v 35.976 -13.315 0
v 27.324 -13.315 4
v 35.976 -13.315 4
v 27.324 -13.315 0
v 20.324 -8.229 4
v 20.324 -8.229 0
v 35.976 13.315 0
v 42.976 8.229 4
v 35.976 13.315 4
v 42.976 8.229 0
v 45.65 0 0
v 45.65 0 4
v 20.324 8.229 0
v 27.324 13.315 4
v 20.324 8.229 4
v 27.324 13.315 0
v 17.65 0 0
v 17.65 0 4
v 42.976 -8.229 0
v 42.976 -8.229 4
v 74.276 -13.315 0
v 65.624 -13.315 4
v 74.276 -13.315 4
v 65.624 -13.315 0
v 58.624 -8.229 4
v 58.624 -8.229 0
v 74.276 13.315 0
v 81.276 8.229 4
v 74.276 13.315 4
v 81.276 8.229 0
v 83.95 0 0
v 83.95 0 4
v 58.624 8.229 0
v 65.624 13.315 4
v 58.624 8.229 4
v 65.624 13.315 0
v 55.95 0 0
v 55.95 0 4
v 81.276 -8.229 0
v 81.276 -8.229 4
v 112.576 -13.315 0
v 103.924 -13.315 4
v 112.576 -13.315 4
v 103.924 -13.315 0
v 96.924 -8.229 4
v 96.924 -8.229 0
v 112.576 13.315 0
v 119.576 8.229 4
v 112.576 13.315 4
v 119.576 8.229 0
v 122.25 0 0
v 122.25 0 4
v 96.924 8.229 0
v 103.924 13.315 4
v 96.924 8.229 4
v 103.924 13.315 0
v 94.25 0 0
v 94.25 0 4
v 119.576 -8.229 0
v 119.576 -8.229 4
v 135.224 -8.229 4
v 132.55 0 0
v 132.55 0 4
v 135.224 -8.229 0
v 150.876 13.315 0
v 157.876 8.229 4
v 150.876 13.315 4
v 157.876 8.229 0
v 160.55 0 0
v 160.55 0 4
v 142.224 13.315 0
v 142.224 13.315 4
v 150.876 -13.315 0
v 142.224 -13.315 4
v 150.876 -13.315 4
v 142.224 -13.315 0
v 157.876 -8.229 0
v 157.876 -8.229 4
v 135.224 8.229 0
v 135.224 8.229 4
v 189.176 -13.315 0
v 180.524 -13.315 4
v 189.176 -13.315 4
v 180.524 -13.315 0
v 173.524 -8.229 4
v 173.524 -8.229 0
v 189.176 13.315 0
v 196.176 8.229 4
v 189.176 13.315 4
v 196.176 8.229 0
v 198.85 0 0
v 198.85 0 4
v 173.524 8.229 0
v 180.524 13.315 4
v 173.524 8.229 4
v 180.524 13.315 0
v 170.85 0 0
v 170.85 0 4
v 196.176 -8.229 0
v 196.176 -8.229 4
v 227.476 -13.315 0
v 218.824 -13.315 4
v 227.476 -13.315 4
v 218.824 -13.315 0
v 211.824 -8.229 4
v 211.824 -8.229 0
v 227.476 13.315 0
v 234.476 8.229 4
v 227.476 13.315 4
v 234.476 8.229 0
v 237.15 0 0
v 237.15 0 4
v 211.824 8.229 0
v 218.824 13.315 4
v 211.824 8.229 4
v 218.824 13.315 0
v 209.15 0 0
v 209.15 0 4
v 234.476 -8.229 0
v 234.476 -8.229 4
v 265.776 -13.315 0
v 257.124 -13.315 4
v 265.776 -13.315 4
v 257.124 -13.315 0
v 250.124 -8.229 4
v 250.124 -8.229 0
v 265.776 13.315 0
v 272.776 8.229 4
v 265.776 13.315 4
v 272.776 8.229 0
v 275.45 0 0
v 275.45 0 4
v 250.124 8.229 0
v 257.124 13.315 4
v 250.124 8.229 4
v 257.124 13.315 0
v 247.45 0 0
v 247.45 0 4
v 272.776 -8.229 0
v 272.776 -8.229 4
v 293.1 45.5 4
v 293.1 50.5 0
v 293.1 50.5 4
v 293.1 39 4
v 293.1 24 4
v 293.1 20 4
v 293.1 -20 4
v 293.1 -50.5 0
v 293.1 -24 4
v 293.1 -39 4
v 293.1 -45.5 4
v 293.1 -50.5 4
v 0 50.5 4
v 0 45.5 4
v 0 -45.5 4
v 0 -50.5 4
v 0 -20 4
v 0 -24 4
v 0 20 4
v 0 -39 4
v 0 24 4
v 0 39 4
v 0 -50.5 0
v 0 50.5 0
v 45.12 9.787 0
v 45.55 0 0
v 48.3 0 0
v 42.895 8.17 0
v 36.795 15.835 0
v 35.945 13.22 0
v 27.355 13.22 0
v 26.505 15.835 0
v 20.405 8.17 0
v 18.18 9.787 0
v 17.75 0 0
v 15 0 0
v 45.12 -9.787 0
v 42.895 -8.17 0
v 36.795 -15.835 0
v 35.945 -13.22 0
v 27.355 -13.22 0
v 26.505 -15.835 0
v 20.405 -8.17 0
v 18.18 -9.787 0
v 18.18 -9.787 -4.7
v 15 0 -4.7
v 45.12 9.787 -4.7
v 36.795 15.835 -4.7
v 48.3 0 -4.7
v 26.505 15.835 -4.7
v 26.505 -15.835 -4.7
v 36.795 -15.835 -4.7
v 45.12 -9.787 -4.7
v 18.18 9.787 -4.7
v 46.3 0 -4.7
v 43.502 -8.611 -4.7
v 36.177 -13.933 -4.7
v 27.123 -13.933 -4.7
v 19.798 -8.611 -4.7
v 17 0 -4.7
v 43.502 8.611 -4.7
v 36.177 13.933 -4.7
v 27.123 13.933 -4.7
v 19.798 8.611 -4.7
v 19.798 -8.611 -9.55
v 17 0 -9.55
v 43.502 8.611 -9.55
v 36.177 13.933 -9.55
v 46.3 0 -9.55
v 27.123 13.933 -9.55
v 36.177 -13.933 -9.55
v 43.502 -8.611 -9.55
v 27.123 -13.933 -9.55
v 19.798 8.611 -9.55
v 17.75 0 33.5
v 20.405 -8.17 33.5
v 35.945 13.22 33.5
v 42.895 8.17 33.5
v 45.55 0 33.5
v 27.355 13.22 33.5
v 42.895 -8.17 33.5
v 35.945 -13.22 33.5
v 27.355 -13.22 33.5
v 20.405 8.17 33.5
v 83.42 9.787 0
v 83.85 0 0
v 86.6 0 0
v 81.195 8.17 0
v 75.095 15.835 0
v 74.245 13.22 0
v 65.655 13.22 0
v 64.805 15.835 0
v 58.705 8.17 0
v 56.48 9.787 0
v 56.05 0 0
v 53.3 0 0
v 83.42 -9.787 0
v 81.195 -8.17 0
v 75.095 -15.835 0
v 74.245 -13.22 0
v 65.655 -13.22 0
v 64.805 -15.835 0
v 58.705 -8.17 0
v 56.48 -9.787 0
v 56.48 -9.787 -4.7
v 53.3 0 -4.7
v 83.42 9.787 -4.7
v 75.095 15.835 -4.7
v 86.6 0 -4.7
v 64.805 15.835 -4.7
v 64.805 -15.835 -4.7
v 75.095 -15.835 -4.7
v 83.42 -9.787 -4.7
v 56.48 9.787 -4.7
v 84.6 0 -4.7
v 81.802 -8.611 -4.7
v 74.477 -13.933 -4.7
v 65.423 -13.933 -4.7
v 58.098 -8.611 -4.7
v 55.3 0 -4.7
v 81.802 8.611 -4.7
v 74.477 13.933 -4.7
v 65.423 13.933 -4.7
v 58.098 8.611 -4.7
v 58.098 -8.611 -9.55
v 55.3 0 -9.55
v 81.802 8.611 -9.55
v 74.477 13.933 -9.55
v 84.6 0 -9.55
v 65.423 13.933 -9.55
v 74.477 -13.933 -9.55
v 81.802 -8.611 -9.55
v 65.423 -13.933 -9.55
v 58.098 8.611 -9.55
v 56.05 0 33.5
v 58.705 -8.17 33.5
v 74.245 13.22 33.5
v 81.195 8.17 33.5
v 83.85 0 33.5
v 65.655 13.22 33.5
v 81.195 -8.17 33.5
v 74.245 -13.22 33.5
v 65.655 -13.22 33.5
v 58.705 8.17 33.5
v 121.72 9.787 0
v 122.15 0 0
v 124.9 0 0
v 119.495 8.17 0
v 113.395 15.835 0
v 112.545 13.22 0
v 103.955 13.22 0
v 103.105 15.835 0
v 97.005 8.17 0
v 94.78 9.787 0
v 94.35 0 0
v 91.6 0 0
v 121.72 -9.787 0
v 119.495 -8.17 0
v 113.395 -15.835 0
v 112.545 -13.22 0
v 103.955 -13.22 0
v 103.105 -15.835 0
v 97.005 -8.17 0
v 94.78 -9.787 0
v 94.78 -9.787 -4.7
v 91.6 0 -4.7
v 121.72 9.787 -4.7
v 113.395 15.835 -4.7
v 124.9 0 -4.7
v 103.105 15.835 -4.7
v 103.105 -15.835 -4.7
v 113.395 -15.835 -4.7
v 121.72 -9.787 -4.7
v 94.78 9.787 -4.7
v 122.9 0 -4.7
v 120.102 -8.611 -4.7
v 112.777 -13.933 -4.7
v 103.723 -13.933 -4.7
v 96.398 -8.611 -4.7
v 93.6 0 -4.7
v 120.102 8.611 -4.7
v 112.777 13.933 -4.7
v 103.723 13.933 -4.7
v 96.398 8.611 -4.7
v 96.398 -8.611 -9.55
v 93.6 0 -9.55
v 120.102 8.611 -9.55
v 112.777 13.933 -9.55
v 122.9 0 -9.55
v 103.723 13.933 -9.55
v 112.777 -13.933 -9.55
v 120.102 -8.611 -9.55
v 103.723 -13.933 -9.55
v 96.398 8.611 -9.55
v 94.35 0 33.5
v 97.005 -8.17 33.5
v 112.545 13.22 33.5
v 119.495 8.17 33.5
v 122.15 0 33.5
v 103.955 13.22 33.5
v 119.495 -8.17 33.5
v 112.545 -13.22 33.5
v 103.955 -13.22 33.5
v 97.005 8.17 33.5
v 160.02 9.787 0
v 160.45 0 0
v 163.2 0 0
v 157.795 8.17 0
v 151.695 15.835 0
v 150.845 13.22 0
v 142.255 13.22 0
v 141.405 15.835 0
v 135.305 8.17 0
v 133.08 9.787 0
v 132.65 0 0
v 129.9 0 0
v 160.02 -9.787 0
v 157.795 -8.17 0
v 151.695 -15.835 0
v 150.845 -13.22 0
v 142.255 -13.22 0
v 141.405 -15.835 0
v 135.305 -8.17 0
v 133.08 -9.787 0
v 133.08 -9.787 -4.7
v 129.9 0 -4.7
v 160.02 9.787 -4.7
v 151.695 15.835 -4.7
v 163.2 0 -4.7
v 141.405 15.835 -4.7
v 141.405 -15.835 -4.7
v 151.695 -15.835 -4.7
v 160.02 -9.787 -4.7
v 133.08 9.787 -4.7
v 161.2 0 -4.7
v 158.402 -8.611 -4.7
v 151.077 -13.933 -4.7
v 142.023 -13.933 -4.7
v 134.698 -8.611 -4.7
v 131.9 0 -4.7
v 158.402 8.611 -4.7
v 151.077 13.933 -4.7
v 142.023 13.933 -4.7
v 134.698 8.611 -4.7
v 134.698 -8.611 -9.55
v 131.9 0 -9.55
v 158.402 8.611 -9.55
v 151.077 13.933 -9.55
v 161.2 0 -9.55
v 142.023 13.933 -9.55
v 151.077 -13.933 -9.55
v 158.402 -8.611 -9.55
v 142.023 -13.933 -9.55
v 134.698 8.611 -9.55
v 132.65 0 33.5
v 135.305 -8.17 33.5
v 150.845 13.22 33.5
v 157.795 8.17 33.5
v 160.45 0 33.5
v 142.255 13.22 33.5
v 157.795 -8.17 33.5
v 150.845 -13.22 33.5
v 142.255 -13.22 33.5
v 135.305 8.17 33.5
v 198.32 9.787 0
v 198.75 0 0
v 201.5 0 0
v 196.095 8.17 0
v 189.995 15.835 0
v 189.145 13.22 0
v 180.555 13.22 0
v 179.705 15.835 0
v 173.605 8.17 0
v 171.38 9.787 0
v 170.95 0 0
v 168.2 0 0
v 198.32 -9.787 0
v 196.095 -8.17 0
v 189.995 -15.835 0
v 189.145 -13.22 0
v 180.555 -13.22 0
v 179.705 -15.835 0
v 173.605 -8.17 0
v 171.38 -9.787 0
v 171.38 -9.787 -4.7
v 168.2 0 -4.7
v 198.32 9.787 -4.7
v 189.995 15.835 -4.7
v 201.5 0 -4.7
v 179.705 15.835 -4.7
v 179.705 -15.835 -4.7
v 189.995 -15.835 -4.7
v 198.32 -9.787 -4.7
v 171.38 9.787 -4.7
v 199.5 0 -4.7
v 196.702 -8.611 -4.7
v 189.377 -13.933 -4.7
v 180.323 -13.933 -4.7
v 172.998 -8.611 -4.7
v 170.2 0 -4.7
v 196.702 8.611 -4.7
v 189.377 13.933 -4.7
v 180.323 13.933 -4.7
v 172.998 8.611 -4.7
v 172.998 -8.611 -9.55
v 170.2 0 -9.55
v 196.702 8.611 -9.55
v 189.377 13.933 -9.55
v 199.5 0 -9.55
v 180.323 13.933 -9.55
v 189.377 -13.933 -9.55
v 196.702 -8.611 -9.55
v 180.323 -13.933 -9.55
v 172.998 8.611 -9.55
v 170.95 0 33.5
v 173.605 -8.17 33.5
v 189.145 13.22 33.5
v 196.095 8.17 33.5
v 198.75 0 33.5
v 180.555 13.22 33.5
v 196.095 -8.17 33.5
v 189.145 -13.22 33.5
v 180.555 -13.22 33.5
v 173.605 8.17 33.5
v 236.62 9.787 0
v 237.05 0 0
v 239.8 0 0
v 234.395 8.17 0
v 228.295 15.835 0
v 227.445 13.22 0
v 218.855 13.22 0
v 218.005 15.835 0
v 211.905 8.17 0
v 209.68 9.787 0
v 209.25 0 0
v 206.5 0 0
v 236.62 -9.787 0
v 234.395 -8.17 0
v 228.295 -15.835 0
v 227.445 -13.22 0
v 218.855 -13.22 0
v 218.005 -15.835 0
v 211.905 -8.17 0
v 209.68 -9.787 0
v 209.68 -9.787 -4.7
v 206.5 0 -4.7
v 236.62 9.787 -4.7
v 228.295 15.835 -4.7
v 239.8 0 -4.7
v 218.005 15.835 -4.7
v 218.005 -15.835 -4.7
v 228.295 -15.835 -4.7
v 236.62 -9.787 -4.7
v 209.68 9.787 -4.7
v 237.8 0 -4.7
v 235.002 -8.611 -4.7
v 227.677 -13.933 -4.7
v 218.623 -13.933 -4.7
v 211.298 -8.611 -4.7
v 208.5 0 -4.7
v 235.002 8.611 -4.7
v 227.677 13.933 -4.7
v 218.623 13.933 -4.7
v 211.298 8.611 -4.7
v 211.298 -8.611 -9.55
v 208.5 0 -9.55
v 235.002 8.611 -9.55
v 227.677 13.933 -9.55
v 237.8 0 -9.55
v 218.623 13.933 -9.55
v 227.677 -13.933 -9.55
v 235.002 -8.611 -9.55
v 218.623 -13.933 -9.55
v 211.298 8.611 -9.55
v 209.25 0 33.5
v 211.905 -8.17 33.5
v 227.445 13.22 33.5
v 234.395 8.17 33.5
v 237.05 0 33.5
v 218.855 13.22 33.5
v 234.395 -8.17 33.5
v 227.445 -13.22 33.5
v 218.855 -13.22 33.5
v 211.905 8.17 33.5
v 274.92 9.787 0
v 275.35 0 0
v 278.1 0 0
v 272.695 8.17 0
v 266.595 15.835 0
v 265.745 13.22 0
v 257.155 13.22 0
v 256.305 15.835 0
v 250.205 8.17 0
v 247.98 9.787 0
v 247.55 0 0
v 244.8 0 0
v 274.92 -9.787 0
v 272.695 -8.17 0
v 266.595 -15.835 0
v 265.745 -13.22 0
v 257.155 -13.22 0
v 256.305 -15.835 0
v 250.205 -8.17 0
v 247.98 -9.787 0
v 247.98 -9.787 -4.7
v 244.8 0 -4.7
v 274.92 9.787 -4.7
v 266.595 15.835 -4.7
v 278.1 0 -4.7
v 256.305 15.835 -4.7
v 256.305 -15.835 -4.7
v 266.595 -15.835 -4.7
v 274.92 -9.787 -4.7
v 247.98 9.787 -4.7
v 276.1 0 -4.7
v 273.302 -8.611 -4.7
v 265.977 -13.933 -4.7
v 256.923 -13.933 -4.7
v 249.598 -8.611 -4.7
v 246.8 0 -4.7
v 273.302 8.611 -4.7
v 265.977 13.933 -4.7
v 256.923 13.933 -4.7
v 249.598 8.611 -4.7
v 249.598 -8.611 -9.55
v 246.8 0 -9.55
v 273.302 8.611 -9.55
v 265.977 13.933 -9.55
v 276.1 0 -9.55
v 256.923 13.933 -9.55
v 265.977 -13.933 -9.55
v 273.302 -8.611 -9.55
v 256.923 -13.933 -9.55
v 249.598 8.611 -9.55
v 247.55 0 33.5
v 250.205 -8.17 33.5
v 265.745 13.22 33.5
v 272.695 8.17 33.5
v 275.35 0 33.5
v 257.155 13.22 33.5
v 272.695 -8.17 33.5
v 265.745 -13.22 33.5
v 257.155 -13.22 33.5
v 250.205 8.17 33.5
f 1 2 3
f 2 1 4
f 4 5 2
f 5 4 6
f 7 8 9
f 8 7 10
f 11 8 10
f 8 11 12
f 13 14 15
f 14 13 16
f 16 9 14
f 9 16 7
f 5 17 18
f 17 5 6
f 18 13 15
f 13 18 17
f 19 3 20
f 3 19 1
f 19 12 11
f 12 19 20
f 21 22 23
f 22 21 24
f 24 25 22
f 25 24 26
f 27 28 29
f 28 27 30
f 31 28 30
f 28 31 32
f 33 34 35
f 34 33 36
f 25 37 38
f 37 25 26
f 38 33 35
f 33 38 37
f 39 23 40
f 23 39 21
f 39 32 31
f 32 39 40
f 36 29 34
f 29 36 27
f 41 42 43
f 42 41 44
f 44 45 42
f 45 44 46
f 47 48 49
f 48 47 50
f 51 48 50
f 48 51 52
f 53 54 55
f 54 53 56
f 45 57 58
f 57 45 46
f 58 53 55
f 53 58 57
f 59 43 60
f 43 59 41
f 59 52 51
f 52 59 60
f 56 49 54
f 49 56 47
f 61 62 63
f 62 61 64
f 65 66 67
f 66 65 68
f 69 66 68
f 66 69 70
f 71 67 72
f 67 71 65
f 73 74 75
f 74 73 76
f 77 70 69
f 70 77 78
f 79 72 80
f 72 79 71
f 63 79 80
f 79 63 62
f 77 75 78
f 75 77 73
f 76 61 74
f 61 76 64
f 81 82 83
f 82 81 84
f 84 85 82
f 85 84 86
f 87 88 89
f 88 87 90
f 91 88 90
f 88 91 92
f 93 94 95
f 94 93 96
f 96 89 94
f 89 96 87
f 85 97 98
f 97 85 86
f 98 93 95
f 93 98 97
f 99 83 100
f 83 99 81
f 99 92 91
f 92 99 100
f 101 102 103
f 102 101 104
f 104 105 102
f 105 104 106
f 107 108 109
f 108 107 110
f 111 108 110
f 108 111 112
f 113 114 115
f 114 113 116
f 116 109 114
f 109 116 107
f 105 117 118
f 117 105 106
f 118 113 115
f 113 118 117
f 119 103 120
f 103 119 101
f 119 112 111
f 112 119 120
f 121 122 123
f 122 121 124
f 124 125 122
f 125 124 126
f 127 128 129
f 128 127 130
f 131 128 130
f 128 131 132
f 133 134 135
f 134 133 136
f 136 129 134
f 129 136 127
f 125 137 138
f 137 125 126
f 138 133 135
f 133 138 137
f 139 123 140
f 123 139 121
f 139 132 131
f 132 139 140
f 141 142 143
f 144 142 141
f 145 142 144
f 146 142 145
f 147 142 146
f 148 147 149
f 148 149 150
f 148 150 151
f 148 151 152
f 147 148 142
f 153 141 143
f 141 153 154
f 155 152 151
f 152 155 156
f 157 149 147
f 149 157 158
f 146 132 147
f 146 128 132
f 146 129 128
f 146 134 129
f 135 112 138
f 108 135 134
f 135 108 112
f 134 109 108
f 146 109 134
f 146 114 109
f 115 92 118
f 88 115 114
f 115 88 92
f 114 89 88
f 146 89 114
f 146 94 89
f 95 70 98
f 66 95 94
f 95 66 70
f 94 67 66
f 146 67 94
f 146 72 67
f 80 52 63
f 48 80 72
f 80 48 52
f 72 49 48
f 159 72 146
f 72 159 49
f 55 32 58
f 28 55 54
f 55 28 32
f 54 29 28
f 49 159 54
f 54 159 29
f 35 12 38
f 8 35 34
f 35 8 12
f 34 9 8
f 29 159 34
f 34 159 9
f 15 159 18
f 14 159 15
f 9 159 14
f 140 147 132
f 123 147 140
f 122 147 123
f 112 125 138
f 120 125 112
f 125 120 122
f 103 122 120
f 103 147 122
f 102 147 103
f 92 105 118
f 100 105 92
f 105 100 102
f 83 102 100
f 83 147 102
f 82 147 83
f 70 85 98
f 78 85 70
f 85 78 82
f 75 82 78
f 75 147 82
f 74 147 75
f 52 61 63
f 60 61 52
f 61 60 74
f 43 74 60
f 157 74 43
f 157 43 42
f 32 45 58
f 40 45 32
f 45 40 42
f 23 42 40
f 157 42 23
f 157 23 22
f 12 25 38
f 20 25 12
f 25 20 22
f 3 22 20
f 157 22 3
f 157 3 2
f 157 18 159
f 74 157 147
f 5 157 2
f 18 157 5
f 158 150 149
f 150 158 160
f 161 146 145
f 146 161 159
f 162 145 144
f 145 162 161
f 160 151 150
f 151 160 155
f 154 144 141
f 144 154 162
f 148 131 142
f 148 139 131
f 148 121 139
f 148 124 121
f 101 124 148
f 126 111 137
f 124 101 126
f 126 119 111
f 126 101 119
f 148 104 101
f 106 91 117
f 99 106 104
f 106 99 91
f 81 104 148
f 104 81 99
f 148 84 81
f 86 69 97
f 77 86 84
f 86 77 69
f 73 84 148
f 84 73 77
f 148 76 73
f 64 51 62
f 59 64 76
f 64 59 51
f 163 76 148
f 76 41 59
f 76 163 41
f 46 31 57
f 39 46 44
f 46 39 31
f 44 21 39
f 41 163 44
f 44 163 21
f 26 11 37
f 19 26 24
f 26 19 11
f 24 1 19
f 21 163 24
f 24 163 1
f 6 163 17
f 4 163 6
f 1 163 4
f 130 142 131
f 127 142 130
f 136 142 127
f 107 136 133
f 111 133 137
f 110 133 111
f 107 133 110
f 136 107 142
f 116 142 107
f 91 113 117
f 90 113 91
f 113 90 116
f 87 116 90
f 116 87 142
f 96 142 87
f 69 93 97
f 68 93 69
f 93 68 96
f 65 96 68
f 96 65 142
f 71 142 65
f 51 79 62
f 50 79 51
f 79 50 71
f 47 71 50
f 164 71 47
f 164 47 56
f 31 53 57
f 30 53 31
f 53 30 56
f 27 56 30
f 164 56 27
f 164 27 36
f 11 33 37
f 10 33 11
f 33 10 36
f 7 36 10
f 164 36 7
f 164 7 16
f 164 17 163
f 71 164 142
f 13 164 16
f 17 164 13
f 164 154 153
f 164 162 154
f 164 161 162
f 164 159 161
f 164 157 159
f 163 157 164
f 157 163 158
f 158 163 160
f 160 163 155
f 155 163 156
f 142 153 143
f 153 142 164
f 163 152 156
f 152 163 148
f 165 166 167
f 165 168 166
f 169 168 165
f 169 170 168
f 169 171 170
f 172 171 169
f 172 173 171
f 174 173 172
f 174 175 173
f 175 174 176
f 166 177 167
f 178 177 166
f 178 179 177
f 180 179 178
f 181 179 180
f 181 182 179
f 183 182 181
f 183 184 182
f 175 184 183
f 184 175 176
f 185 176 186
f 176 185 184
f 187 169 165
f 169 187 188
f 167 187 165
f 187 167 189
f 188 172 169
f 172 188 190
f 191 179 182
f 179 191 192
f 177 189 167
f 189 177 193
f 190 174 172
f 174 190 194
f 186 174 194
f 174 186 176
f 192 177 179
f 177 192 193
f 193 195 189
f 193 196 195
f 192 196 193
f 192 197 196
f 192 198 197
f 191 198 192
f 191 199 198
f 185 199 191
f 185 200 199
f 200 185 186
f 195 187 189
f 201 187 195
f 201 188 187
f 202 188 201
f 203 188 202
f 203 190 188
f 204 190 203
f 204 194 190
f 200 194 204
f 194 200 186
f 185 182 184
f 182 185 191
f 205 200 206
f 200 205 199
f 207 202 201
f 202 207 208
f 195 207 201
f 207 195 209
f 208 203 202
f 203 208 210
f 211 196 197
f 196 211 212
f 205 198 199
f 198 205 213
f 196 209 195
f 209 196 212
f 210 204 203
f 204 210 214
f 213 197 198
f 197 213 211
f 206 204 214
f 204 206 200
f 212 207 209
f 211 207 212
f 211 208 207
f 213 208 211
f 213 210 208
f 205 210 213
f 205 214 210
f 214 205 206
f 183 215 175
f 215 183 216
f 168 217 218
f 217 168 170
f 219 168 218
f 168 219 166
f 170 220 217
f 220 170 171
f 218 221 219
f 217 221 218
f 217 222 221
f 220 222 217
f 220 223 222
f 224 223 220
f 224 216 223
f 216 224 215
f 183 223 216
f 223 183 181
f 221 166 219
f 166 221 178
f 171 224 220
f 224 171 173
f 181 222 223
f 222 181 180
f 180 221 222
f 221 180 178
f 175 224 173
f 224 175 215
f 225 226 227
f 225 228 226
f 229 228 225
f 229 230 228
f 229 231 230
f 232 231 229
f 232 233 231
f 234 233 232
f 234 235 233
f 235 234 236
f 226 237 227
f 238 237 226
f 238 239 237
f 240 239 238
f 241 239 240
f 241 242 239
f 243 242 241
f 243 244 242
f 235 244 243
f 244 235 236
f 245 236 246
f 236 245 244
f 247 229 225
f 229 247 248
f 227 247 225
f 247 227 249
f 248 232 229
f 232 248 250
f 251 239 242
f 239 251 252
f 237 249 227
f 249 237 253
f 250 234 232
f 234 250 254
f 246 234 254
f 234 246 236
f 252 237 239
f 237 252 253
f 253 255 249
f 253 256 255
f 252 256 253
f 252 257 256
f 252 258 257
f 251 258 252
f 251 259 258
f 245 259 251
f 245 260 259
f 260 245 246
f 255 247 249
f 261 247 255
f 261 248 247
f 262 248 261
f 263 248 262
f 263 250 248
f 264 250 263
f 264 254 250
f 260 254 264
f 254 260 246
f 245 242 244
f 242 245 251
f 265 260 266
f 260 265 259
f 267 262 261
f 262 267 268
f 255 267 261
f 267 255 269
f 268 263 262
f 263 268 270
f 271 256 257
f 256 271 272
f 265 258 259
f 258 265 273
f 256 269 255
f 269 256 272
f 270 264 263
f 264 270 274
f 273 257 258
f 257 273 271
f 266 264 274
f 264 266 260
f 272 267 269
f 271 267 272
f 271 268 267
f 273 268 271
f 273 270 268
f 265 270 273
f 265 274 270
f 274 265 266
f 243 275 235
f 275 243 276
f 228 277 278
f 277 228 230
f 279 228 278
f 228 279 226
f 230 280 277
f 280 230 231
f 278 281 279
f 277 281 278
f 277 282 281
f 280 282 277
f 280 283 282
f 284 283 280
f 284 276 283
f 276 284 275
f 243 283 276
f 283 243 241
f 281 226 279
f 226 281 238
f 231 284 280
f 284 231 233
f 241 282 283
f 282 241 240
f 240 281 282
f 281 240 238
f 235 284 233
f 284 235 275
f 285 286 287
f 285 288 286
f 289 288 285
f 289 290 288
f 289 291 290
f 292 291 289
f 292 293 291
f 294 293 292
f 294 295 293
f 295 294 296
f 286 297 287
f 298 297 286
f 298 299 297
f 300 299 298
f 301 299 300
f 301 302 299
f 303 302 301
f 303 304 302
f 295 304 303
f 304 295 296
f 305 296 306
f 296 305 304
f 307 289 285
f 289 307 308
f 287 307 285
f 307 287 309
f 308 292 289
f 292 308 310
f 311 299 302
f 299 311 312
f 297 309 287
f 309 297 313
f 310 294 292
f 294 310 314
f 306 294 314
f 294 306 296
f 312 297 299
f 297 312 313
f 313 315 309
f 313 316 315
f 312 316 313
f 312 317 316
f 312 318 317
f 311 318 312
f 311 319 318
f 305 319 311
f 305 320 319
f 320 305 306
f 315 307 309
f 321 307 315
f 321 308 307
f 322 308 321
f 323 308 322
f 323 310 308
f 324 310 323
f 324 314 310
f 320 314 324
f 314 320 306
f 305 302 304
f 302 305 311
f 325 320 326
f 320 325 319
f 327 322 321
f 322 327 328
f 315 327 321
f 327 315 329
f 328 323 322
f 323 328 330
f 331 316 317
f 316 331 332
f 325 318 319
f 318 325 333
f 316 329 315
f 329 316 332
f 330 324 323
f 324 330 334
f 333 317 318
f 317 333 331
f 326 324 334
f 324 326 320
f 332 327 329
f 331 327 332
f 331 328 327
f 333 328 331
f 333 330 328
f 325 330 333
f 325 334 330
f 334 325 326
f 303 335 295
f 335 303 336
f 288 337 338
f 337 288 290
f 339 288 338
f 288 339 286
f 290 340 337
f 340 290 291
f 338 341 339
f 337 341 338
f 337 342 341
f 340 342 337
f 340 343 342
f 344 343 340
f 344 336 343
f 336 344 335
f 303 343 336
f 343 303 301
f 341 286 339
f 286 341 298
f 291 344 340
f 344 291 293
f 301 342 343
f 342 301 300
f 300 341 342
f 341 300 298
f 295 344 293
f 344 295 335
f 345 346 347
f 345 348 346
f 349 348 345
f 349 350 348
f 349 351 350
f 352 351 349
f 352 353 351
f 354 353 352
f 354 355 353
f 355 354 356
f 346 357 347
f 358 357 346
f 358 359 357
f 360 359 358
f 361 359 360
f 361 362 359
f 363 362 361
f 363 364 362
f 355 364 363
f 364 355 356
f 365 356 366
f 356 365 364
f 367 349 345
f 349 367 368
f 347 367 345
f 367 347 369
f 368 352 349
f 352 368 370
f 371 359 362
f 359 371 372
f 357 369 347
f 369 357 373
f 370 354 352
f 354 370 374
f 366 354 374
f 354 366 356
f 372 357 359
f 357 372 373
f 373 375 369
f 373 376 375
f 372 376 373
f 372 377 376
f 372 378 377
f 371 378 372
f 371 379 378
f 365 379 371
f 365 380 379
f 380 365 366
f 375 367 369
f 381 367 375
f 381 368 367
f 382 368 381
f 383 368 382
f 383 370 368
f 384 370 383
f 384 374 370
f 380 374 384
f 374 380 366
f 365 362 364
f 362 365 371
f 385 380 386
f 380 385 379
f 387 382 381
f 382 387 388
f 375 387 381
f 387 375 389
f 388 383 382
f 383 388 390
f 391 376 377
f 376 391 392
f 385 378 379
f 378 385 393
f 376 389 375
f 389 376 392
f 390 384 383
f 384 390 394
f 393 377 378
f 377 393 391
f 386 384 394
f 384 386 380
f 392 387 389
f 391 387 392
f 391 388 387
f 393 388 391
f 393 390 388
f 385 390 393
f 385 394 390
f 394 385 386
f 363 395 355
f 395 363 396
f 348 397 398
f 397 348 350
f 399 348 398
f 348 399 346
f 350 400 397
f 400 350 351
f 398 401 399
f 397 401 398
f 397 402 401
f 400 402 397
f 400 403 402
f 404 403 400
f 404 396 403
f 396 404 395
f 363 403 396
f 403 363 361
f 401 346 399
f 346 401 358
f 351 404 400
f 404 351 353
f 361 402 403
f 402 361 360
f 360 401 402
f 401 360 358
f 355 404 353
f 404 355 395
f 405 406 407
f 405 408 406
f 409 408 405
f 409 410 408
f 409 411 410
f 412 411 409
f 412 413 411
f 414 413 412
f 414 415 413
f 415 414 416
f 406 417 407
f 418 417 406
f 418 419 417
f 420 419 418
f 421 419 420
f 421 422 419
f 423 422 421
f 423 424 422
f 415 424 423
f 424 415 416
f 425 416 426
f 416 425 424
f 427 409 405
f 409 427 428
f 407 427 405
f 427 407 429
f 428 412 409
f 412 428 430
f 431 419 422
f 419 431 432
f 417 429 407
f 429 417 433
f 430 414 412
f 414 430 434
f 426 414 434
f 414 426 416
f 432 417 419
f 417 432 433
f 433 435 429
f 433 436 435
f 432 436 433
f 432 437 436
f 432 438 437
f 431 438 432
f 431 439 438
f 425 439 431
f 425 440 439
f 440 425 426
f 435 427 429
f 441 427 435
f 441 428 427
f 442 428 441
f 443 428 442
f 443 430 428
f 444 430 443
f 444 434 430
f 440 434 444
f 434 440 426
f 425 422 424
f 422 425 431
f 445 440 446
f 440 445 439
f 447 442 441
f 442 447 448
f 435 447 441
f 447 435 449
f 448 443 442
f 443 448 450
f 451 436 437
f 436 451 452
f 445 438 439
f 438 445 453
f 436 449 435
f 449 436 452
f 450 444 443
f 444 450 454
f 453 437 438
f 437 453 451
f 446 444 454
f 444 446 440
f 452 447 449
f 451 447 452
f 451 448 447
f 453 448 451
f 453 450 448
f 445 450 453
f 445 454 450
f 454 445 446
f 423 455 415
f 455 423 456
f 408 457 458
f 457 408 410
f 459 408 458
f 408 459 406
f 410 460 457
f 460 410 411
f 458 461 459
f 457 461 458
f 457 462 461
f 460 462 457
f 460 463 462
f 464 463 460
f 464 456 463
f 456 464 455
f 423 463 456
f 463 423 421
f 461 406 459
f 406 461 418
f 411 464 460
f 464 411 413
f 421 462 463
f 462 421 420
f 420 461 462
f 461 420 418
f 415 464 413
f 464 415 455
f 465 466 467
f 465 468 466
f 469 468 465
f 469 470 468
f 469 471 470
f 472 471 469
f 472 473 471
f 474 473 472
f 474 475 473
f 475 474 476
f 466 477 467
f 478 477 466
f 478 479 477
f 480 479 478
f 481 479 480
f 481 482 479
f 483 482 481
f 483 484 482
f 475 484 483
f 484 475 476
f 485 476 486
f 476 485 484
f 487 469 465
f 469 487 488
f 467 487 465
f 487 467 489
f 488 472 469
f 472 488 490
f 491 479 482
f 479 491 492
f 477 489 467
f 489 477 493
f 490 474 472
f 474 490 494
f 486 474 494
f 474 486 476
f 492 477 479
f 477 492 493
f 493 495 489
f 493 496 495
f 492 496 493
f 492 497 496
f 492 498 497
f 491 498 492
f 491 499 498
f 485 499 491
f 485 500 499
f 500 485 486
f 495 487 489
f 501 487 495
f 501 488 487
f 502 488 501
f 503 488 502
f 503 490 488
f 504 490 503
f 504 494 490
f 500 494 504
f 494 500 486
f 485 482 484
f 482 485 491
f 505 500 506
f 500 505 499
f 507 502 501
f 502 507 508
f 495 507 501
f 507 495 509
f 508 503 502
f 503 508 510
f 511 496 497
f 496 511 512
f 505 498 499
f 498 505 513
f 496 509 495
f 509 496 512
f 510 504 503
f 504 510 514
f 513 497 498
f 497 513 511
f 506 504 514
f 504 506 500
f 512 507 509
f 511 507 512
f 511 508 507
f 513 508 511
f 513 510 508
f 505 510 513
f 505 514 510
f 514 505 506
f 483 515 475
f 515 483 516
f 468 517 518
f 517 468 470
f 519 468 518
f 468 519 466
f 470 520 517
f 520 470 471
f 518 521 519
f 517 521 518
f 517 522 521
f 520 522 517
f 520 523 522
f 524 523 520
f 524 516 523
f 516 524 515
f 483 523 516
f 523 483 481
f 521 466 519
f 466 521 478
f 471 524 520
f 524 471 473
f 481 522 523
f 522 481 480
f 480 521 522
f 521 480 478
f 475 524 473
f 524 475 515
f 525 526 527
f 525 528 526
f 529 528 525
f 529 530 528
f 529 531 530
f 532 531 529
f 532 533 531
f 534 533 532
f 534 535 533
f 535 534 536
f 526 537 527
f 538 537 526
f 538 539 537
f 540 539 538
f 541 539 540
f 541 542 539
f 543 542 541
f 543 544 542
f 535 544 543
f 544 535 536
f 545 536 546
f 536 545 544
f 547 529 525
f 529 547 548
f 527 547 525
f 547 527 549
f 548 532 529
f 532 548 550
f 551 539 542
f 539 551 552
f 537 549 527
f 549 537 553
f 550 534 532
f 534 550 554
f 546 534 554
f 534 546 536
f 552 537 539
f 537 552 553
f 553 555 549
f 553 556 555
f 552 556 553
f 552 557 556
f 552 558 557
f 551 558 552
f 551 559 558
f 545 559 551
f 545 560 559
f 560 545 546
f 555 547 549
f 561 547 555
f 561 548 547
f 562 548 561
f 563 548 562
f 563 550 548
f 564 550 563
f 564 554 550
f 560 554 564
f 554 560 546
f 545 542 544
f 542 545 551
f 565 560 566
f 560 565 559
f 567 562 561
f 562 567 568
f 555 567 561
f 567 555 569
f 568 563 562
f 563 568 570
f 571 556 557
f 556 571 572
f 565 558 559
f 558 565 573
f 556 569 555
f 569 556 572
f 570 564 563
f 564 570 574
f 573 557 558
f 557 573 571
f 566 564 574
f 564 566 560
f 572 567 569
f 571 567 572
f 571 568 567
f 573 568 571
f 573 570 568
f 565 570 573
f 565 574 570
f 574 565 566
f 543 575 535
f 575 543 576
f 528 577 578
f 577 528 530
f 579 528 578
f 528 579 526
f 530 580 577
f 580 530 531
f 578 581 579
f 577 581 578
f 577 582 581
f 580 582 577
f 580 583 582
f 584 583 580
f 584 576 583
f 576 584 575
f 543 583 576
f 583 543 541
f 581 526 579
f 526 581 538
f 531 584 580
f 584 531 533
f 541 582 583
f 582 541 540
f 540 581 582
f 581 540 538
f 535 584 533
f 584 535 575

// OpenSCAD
// file: bouton_arcade.scad
include <parametre.scad>

bouton_arcade();

module bouton_arcade() {
	union() {
		cylinder(hauteur_bague_bouton_arcade, d=diametre_bouton_arcade, $fn=resolution);
		translate([0, 0, -hauteur_bouton_arcade])
			cylinder(hauteur_bouton_arcade, d=diametre_push_bouton_arcade, $fn=resolution);
		translate([0, 0, hauteur_bague_bouton_arcade])
			cylinder(profondeur_interne_bouton_arcade, d=diametre_trou_bouton_arcade, $fn=resolution);
	}
}

module trou_bouton_arcade(epaisseur) {
	translate([0, 0, -difference_objet_marge / 2])
		cylinder(epaisseur + difference_objet_marge, d=diametre_trou_bouton_arcade + padding_percage, $fn=resolution);
}
// file: parametre.scad
/* pour le rendu openscad */

// pour la finesse de rendu
// plus c'est élevé, mieux c'est... mais ça prend plus de temps et de ressource
resolution = 10;

// pour export DXF
show_mode_projection = 0;

// pour enlever de la matière des objets dans openscad et être certain qu'il ne reste pas un bout de face
difference_objet_marge = 20;

// pour afficher (1) ou pas (0) les accessoires installés
show_accessoires = 1;

show_incrustations = 0;

show_logo_r2builders = 0;



/* pour le design du jeu  */

// tout est en millimetre !!!!

// configuration globale
////////////////////////

// quand on perce et que l'on va insérer quelque chose dedans...
// il faut un peu de vide en plus ;)
padding_percage = 0.2;

// espace supplémentaire pour la largeur de rainure
padding_rainure = 0; // 1

// profondeur standard pour une rainure
profondeur_rainure = 0; // 2 // moins que epaisseur_tole_grille_led et que epaisseur_tole_grille_led ! Il faut qu'il reste de la matière !

// définition de base du jeu
nombre_colonnes = 7;
nombre_lignes = 6;


// les boutons de sélection de colonne et du nombre de joueurs
//////////////////////////////////////////////////////////////
diametre_bouton_arcade = 33.3;
rayon_bouton_arcade = diametre_bouton_arcade / 2;
diametre_trou_bouton_arcade = 27.8;
rayon_trou_bouton_arcade = diametre_trou_bouton_arcade / 2;
hauteur_bague_bouton_arcade = 4.7;
hauteur_bouton_arcade = 4.85;
diametre_push_bouton_arcade = diametre_bouton_arcade - 4;
profondeur_interne_bouton_arcade = 33.5;


// bouton EC11
//////////////
diametre_bouton_ec11 = 14.4;
hauteur_bouton_ec11 = 13.1;
epaisseur_trait_ec11 = 1;
trou_axe_ec11 = 7;
espace_platine_bouton = 10.7;
hauteur_platine_ec11 = 33.4;
largeur_platine_ec11 = 27.5;
epaisseur_platine_ec11 = 1.3;
trou_fixation_ec11 = 3;
trou_marge_ec11 = 2.40;


// haut-parleur HP8R
////////////////////
HP8R_epaisseur_totale = 16.25;
HP8R_largeur = 36.24;
HP8R_hauteur = 75;
HP8R_epaisseur_tole = 1.63;
HP8R_hauteur_caisson = 71;
//HP8R_epaisseur_caisson = 16.25 - HP8R_epaisseur_tole;
HP8R_decalage_hauteur_trou = 12.3;
HP8R_largeur_trou = 27.1;
HP8R_hauteur_trou = 38.3;
HP8R_epaisseur_trou = HP8R_epaisseur_totale - 2;
HP8R_diametre_creuse_coins = 10;
HP8R_diametre_creuse_fixation = 3;
HP8R_marge_creuse_fixation = 1.6 + padding_percage;


// Embase alimentation
//////////////////////
embase_decallage = 3.3;
embase_externe_largeur = 8.95;
embase_externe_hauteur = 10.7;
embase_externe_profondeur = 3.5;
embase_externe_marge_trou = 3.3;
embase_externe_diametre_trou = 6.4;
embase_externe_diametre_pin = 1.6;
embase_interne_profondeur = 10.6;
embase_platine_profondeur = 25.5;
embase_platine_decallage = 5.6;
embase_platine_largeur = 25.9;
embase_platine_epaisseur = 1.6;
embase_marge_fixation = 1.5;
embase_diametre_fixation = 3;


// led type1 : LED étanche avec électronique carré
////////////
profondeur_chapeau_led = 7.5;
diametre_trou_led = 9;
diametre_interne_led = 9;
profondeur_interne_led = 0;
boitier_largeur_led = 17.2;
boitier_hauteur_led = 11.2;
boitier_epaisseur_led = 5;


// cadrillage autour des LEDs
/////////////////////////////
profondeur_separateur_led = 15; // TODO: à valider !


// pour stocker les cables et l'électronique
////////////////////////////////////////////
espace_vide_milieu = 40; // TODO: à valider !   vérifier qu'il n'y a pas de conflit entre bouton et led en haut !!!


// le mur Star Wars fenetré
///////////////////////////
epaisseur_tole_mur = 4;
taille_fenetre = diametre_bouton_arcade; // valeur à fixer si bouton plus petit, ici je m'adapte à cette taille de bouton
ecart_entre_fenetre = 5; // au jugé ;)
marge_mur = 15; // pour aérer le tour   10 => haut parleur touche led et conflit bouton dans le coin !

// on peut maintenant calculer la surface du jeu !
largeur_mur = marge_mur + (nombre_colonnes * taille_fenetre) + ((nombre_colonnes - 1) * ecart_entre_fenetre) + marge_mur;
hauteur_mur = marge_mur + (nombre_lignes * taille_fenetre) + ((nombre_lignes - 1) * ecart_entre_fenetre) + marge_mur;
echo(str("** PLAQUE MUR (x2) : ", largeur_mur , " x ", hauteur_mur, " x ", epaisseur_tole_mur));


// la grille de LEDS
////////////////////
epaisseur_tole_grille_led = 4;
largeur_rainure_grille_led = epaisseur_tole_grille_led + padding_rainure;
profondeur_rainure_grille_led = profondeur_rainure; // moins que epaisseur_tole_grille_led !!!
echo(str("** PLAQUE GRILLE LED (x2) : ", largeur_mur , " x ", hauteur_mur, " x ", epaisseur_tole_grille_led));


// le plexi blanc derrière le mur, pour faire les fenêtres
//////////////////////////////////////////////////////////
epaisseur_plexi_blanc = 2.5;
transparence_plexi = 1;
echo(str("** PLAQUE PLEXI BLANC (x2) : ", largeur_mur , " x ", hauteur_mur, " x ", epaisseur_plexi_blanc));


// calcul de l'épaisseur complète du jeu
epaisseur_jeu = espace_vide_milieu + 2 * epaisseur_tole_mur + 2 * epaisseur_plexi_blanc + 2 * epaisseur_tole_grille_led + 2 * profondeur_separateur_led;


// la plaque du dessus avec les boutons de choix de colonne
///////////////////////////////////////////////////////////
epaisseur_tole_dessus = 4; // ce "chapeau" sera rainurée pour tenir les plaques !
debord_rainure = 5; // qui dépasse de devant et derrière 
profondeur_dessus = epaisseur_jeu + 2 * debord_rainure;
marge_largeur_dessus = (largeur_mur - (nombre_colonnes * diametre_bouton_arcade) - ((nombre_colonnes - 1) * ecart_entre_fenetre)) / 2;
largeur_rainure_mur_plexi = epaisseur_tole_mur + epaisseur_plexi_blanc + padding_rainure;
profondeur_rainure_mur_plexi = profondeur_rainure; // moins que epaisseur_tole_dessus !!!
echo(str("** PLAQUE DESSUS : ", largeur_mur , " x ", profondeur_dessus, " x ", epaisseur_tole_dessus));


// la plaque de dessous
///////////////////////
epaisseur_tole_dessous = 4; // ce socle sera rainurée pour tenir les plaques !
dessous_debord_rainure = 50;
profondeur_dessous = epaisseur_jeu + 2 * dessous_debord_rainure;
echo(str("** PLAQUE SOCLE : ", largeur_mur , " x ", profondeur_dessous, " x ", epaisseur_tole_dessous));


hauteur_cote = epaisseur_tole_dessous + hauteur_mur + epaisseur_tole_dessus - 2 * profondeur_rainure_grille_led;
largeur_cote = profondeur_dessus;


// côté gauche
//////////////
epaisseur_tole_gauche = 4;
echo(str("** PLAQUE COTE GAUCHE : ", largeur_cote , " x ", hauteur_cote, " x ", epaisseur_tole_gauche));


// côté droit
/////////////
epaisseur_tole_droit = 4;
position_ec11 = epaisseur_tole_dessous + embase_platine_epaisseur + embase_externe_hauteur + 15 + hauteur_platine_ec11 / 2; // 15 = taille d'une pinouille arduino connectée sur l'embase
echo(str("** PLAQUE COTE DROIT : ", largeur_cote , " x ", hauteur_cote, " x ", epaisseur_tole_droit));

position_haut_parleur_HP8R = position_ec11 + hauteur_platine_ec11 / 2 + 5;
// main file
include <parametre.scad>
use <bouton_arcade.scad>

// pour exporter en .dxf
if(show_mode_projection == 1)
projection(cut = false) dessus();

if(show_mode_projection == 0)
translate([0, -profondeur_dessus / 2, 0]) dessus();

module dessus() {
    color("Blue") {
        difference() {
			// une belle dalle
            cube(size=[largeur_mur, profondeur_dessus, epaisseur_tole_dessus]);
			// on fait les trous pour les 7 colonnes
            pose_trous_bouton();
			
			
			// rainure pour grille de LEDs
            translate([- difference_objet_marge / 2, 
					profondeur_dessus / 2 - largeur_rainure_grille_led - espace_vide_milieu / 2, 
					epaisseur_tole_dessus - profondeur_rainure_grille_led])
                cube(size=[largeur_mur + difference_objet_marge, largeur_rainure_grille_led, profondeur_rainure_grille_led + difference_objet_marge]);

			// rainure pour grille de LEDs
            translate([- difference_objet_marge / 2, 
					profondeur_dessus / 2 + espace_vide_milieu / 2, 
					epaisseur_tole_dessus - profondeur_rainure_grille_led])
                cube(size=[largeur_mur + difference_objet_marge, largeur_rainure_grille_led, profondeur_rainure_grille_led + difference_objet_marge]);

			
			// rainure pour plexi blanc et mur star wars
            translate([- difference_objet_marge / 2, 
					profondeur_dessus / 2 - largeur_rainure_mur_plexi - espace_vide_milieu / 2 - epaisseur_tole_grille_led - profondeur_separateur_led,
					epaisseur_tole_dessus - profondeur_rainure_mur_plexi])
                cube(size=[largeur_mur + difference_objet_marge, largeur_rainure_mur_plexi, profondeur_rainure_mur_plexi + difference_objet_marge]);
				
			// rainure pour plexi blanc et mur star wars
            translate([- difference_objet_marge / 2, 
					profondeur_dessus / 2 + espace_vide_milieu / 2 + epaisseur_tole_grille_led + profondeur_separateur_led, 
					epaisseur_tole_dessus - profondeur_rainure_mur_plexi])
                cube(size=[largeur_mur + difference_objet_marge, largeur_rainure_mur_plexi, profondeur_rainure_mur_plexi + difference_objet_marge]);
		
        }
	}
		
	if(show_accessoires == 1) {
		
		for(colonne = [1 : nombre_colonnes]) {
			translate([marge_mur + diametre_bouton_arcade / 2 + (colonne - 1) * (diametre_bouton_arcade + ecart_entre_fenetre), 
					profondeur_dessus / 2 , -hauteur_bague_bouton_arcade]) 
				color([1, 1, 1]) bouton_arcade();
		}
		
	}
}

module pose_trous_bouton() {
    for(colonne = [1 : nombre_colonnes]) {
        translate([marge_mur + diametre_bouton_arcade / 2 + (colonne - 1) * (diametre_bouton_arcade + ecart_entre_fenetre), 
				profondeur_dessus / 2 , - difference_objet_marge / 2]) 
            trou_bouton_arcade(epaisseur_tole_dessus + difference_objet_marge);
    }
}
